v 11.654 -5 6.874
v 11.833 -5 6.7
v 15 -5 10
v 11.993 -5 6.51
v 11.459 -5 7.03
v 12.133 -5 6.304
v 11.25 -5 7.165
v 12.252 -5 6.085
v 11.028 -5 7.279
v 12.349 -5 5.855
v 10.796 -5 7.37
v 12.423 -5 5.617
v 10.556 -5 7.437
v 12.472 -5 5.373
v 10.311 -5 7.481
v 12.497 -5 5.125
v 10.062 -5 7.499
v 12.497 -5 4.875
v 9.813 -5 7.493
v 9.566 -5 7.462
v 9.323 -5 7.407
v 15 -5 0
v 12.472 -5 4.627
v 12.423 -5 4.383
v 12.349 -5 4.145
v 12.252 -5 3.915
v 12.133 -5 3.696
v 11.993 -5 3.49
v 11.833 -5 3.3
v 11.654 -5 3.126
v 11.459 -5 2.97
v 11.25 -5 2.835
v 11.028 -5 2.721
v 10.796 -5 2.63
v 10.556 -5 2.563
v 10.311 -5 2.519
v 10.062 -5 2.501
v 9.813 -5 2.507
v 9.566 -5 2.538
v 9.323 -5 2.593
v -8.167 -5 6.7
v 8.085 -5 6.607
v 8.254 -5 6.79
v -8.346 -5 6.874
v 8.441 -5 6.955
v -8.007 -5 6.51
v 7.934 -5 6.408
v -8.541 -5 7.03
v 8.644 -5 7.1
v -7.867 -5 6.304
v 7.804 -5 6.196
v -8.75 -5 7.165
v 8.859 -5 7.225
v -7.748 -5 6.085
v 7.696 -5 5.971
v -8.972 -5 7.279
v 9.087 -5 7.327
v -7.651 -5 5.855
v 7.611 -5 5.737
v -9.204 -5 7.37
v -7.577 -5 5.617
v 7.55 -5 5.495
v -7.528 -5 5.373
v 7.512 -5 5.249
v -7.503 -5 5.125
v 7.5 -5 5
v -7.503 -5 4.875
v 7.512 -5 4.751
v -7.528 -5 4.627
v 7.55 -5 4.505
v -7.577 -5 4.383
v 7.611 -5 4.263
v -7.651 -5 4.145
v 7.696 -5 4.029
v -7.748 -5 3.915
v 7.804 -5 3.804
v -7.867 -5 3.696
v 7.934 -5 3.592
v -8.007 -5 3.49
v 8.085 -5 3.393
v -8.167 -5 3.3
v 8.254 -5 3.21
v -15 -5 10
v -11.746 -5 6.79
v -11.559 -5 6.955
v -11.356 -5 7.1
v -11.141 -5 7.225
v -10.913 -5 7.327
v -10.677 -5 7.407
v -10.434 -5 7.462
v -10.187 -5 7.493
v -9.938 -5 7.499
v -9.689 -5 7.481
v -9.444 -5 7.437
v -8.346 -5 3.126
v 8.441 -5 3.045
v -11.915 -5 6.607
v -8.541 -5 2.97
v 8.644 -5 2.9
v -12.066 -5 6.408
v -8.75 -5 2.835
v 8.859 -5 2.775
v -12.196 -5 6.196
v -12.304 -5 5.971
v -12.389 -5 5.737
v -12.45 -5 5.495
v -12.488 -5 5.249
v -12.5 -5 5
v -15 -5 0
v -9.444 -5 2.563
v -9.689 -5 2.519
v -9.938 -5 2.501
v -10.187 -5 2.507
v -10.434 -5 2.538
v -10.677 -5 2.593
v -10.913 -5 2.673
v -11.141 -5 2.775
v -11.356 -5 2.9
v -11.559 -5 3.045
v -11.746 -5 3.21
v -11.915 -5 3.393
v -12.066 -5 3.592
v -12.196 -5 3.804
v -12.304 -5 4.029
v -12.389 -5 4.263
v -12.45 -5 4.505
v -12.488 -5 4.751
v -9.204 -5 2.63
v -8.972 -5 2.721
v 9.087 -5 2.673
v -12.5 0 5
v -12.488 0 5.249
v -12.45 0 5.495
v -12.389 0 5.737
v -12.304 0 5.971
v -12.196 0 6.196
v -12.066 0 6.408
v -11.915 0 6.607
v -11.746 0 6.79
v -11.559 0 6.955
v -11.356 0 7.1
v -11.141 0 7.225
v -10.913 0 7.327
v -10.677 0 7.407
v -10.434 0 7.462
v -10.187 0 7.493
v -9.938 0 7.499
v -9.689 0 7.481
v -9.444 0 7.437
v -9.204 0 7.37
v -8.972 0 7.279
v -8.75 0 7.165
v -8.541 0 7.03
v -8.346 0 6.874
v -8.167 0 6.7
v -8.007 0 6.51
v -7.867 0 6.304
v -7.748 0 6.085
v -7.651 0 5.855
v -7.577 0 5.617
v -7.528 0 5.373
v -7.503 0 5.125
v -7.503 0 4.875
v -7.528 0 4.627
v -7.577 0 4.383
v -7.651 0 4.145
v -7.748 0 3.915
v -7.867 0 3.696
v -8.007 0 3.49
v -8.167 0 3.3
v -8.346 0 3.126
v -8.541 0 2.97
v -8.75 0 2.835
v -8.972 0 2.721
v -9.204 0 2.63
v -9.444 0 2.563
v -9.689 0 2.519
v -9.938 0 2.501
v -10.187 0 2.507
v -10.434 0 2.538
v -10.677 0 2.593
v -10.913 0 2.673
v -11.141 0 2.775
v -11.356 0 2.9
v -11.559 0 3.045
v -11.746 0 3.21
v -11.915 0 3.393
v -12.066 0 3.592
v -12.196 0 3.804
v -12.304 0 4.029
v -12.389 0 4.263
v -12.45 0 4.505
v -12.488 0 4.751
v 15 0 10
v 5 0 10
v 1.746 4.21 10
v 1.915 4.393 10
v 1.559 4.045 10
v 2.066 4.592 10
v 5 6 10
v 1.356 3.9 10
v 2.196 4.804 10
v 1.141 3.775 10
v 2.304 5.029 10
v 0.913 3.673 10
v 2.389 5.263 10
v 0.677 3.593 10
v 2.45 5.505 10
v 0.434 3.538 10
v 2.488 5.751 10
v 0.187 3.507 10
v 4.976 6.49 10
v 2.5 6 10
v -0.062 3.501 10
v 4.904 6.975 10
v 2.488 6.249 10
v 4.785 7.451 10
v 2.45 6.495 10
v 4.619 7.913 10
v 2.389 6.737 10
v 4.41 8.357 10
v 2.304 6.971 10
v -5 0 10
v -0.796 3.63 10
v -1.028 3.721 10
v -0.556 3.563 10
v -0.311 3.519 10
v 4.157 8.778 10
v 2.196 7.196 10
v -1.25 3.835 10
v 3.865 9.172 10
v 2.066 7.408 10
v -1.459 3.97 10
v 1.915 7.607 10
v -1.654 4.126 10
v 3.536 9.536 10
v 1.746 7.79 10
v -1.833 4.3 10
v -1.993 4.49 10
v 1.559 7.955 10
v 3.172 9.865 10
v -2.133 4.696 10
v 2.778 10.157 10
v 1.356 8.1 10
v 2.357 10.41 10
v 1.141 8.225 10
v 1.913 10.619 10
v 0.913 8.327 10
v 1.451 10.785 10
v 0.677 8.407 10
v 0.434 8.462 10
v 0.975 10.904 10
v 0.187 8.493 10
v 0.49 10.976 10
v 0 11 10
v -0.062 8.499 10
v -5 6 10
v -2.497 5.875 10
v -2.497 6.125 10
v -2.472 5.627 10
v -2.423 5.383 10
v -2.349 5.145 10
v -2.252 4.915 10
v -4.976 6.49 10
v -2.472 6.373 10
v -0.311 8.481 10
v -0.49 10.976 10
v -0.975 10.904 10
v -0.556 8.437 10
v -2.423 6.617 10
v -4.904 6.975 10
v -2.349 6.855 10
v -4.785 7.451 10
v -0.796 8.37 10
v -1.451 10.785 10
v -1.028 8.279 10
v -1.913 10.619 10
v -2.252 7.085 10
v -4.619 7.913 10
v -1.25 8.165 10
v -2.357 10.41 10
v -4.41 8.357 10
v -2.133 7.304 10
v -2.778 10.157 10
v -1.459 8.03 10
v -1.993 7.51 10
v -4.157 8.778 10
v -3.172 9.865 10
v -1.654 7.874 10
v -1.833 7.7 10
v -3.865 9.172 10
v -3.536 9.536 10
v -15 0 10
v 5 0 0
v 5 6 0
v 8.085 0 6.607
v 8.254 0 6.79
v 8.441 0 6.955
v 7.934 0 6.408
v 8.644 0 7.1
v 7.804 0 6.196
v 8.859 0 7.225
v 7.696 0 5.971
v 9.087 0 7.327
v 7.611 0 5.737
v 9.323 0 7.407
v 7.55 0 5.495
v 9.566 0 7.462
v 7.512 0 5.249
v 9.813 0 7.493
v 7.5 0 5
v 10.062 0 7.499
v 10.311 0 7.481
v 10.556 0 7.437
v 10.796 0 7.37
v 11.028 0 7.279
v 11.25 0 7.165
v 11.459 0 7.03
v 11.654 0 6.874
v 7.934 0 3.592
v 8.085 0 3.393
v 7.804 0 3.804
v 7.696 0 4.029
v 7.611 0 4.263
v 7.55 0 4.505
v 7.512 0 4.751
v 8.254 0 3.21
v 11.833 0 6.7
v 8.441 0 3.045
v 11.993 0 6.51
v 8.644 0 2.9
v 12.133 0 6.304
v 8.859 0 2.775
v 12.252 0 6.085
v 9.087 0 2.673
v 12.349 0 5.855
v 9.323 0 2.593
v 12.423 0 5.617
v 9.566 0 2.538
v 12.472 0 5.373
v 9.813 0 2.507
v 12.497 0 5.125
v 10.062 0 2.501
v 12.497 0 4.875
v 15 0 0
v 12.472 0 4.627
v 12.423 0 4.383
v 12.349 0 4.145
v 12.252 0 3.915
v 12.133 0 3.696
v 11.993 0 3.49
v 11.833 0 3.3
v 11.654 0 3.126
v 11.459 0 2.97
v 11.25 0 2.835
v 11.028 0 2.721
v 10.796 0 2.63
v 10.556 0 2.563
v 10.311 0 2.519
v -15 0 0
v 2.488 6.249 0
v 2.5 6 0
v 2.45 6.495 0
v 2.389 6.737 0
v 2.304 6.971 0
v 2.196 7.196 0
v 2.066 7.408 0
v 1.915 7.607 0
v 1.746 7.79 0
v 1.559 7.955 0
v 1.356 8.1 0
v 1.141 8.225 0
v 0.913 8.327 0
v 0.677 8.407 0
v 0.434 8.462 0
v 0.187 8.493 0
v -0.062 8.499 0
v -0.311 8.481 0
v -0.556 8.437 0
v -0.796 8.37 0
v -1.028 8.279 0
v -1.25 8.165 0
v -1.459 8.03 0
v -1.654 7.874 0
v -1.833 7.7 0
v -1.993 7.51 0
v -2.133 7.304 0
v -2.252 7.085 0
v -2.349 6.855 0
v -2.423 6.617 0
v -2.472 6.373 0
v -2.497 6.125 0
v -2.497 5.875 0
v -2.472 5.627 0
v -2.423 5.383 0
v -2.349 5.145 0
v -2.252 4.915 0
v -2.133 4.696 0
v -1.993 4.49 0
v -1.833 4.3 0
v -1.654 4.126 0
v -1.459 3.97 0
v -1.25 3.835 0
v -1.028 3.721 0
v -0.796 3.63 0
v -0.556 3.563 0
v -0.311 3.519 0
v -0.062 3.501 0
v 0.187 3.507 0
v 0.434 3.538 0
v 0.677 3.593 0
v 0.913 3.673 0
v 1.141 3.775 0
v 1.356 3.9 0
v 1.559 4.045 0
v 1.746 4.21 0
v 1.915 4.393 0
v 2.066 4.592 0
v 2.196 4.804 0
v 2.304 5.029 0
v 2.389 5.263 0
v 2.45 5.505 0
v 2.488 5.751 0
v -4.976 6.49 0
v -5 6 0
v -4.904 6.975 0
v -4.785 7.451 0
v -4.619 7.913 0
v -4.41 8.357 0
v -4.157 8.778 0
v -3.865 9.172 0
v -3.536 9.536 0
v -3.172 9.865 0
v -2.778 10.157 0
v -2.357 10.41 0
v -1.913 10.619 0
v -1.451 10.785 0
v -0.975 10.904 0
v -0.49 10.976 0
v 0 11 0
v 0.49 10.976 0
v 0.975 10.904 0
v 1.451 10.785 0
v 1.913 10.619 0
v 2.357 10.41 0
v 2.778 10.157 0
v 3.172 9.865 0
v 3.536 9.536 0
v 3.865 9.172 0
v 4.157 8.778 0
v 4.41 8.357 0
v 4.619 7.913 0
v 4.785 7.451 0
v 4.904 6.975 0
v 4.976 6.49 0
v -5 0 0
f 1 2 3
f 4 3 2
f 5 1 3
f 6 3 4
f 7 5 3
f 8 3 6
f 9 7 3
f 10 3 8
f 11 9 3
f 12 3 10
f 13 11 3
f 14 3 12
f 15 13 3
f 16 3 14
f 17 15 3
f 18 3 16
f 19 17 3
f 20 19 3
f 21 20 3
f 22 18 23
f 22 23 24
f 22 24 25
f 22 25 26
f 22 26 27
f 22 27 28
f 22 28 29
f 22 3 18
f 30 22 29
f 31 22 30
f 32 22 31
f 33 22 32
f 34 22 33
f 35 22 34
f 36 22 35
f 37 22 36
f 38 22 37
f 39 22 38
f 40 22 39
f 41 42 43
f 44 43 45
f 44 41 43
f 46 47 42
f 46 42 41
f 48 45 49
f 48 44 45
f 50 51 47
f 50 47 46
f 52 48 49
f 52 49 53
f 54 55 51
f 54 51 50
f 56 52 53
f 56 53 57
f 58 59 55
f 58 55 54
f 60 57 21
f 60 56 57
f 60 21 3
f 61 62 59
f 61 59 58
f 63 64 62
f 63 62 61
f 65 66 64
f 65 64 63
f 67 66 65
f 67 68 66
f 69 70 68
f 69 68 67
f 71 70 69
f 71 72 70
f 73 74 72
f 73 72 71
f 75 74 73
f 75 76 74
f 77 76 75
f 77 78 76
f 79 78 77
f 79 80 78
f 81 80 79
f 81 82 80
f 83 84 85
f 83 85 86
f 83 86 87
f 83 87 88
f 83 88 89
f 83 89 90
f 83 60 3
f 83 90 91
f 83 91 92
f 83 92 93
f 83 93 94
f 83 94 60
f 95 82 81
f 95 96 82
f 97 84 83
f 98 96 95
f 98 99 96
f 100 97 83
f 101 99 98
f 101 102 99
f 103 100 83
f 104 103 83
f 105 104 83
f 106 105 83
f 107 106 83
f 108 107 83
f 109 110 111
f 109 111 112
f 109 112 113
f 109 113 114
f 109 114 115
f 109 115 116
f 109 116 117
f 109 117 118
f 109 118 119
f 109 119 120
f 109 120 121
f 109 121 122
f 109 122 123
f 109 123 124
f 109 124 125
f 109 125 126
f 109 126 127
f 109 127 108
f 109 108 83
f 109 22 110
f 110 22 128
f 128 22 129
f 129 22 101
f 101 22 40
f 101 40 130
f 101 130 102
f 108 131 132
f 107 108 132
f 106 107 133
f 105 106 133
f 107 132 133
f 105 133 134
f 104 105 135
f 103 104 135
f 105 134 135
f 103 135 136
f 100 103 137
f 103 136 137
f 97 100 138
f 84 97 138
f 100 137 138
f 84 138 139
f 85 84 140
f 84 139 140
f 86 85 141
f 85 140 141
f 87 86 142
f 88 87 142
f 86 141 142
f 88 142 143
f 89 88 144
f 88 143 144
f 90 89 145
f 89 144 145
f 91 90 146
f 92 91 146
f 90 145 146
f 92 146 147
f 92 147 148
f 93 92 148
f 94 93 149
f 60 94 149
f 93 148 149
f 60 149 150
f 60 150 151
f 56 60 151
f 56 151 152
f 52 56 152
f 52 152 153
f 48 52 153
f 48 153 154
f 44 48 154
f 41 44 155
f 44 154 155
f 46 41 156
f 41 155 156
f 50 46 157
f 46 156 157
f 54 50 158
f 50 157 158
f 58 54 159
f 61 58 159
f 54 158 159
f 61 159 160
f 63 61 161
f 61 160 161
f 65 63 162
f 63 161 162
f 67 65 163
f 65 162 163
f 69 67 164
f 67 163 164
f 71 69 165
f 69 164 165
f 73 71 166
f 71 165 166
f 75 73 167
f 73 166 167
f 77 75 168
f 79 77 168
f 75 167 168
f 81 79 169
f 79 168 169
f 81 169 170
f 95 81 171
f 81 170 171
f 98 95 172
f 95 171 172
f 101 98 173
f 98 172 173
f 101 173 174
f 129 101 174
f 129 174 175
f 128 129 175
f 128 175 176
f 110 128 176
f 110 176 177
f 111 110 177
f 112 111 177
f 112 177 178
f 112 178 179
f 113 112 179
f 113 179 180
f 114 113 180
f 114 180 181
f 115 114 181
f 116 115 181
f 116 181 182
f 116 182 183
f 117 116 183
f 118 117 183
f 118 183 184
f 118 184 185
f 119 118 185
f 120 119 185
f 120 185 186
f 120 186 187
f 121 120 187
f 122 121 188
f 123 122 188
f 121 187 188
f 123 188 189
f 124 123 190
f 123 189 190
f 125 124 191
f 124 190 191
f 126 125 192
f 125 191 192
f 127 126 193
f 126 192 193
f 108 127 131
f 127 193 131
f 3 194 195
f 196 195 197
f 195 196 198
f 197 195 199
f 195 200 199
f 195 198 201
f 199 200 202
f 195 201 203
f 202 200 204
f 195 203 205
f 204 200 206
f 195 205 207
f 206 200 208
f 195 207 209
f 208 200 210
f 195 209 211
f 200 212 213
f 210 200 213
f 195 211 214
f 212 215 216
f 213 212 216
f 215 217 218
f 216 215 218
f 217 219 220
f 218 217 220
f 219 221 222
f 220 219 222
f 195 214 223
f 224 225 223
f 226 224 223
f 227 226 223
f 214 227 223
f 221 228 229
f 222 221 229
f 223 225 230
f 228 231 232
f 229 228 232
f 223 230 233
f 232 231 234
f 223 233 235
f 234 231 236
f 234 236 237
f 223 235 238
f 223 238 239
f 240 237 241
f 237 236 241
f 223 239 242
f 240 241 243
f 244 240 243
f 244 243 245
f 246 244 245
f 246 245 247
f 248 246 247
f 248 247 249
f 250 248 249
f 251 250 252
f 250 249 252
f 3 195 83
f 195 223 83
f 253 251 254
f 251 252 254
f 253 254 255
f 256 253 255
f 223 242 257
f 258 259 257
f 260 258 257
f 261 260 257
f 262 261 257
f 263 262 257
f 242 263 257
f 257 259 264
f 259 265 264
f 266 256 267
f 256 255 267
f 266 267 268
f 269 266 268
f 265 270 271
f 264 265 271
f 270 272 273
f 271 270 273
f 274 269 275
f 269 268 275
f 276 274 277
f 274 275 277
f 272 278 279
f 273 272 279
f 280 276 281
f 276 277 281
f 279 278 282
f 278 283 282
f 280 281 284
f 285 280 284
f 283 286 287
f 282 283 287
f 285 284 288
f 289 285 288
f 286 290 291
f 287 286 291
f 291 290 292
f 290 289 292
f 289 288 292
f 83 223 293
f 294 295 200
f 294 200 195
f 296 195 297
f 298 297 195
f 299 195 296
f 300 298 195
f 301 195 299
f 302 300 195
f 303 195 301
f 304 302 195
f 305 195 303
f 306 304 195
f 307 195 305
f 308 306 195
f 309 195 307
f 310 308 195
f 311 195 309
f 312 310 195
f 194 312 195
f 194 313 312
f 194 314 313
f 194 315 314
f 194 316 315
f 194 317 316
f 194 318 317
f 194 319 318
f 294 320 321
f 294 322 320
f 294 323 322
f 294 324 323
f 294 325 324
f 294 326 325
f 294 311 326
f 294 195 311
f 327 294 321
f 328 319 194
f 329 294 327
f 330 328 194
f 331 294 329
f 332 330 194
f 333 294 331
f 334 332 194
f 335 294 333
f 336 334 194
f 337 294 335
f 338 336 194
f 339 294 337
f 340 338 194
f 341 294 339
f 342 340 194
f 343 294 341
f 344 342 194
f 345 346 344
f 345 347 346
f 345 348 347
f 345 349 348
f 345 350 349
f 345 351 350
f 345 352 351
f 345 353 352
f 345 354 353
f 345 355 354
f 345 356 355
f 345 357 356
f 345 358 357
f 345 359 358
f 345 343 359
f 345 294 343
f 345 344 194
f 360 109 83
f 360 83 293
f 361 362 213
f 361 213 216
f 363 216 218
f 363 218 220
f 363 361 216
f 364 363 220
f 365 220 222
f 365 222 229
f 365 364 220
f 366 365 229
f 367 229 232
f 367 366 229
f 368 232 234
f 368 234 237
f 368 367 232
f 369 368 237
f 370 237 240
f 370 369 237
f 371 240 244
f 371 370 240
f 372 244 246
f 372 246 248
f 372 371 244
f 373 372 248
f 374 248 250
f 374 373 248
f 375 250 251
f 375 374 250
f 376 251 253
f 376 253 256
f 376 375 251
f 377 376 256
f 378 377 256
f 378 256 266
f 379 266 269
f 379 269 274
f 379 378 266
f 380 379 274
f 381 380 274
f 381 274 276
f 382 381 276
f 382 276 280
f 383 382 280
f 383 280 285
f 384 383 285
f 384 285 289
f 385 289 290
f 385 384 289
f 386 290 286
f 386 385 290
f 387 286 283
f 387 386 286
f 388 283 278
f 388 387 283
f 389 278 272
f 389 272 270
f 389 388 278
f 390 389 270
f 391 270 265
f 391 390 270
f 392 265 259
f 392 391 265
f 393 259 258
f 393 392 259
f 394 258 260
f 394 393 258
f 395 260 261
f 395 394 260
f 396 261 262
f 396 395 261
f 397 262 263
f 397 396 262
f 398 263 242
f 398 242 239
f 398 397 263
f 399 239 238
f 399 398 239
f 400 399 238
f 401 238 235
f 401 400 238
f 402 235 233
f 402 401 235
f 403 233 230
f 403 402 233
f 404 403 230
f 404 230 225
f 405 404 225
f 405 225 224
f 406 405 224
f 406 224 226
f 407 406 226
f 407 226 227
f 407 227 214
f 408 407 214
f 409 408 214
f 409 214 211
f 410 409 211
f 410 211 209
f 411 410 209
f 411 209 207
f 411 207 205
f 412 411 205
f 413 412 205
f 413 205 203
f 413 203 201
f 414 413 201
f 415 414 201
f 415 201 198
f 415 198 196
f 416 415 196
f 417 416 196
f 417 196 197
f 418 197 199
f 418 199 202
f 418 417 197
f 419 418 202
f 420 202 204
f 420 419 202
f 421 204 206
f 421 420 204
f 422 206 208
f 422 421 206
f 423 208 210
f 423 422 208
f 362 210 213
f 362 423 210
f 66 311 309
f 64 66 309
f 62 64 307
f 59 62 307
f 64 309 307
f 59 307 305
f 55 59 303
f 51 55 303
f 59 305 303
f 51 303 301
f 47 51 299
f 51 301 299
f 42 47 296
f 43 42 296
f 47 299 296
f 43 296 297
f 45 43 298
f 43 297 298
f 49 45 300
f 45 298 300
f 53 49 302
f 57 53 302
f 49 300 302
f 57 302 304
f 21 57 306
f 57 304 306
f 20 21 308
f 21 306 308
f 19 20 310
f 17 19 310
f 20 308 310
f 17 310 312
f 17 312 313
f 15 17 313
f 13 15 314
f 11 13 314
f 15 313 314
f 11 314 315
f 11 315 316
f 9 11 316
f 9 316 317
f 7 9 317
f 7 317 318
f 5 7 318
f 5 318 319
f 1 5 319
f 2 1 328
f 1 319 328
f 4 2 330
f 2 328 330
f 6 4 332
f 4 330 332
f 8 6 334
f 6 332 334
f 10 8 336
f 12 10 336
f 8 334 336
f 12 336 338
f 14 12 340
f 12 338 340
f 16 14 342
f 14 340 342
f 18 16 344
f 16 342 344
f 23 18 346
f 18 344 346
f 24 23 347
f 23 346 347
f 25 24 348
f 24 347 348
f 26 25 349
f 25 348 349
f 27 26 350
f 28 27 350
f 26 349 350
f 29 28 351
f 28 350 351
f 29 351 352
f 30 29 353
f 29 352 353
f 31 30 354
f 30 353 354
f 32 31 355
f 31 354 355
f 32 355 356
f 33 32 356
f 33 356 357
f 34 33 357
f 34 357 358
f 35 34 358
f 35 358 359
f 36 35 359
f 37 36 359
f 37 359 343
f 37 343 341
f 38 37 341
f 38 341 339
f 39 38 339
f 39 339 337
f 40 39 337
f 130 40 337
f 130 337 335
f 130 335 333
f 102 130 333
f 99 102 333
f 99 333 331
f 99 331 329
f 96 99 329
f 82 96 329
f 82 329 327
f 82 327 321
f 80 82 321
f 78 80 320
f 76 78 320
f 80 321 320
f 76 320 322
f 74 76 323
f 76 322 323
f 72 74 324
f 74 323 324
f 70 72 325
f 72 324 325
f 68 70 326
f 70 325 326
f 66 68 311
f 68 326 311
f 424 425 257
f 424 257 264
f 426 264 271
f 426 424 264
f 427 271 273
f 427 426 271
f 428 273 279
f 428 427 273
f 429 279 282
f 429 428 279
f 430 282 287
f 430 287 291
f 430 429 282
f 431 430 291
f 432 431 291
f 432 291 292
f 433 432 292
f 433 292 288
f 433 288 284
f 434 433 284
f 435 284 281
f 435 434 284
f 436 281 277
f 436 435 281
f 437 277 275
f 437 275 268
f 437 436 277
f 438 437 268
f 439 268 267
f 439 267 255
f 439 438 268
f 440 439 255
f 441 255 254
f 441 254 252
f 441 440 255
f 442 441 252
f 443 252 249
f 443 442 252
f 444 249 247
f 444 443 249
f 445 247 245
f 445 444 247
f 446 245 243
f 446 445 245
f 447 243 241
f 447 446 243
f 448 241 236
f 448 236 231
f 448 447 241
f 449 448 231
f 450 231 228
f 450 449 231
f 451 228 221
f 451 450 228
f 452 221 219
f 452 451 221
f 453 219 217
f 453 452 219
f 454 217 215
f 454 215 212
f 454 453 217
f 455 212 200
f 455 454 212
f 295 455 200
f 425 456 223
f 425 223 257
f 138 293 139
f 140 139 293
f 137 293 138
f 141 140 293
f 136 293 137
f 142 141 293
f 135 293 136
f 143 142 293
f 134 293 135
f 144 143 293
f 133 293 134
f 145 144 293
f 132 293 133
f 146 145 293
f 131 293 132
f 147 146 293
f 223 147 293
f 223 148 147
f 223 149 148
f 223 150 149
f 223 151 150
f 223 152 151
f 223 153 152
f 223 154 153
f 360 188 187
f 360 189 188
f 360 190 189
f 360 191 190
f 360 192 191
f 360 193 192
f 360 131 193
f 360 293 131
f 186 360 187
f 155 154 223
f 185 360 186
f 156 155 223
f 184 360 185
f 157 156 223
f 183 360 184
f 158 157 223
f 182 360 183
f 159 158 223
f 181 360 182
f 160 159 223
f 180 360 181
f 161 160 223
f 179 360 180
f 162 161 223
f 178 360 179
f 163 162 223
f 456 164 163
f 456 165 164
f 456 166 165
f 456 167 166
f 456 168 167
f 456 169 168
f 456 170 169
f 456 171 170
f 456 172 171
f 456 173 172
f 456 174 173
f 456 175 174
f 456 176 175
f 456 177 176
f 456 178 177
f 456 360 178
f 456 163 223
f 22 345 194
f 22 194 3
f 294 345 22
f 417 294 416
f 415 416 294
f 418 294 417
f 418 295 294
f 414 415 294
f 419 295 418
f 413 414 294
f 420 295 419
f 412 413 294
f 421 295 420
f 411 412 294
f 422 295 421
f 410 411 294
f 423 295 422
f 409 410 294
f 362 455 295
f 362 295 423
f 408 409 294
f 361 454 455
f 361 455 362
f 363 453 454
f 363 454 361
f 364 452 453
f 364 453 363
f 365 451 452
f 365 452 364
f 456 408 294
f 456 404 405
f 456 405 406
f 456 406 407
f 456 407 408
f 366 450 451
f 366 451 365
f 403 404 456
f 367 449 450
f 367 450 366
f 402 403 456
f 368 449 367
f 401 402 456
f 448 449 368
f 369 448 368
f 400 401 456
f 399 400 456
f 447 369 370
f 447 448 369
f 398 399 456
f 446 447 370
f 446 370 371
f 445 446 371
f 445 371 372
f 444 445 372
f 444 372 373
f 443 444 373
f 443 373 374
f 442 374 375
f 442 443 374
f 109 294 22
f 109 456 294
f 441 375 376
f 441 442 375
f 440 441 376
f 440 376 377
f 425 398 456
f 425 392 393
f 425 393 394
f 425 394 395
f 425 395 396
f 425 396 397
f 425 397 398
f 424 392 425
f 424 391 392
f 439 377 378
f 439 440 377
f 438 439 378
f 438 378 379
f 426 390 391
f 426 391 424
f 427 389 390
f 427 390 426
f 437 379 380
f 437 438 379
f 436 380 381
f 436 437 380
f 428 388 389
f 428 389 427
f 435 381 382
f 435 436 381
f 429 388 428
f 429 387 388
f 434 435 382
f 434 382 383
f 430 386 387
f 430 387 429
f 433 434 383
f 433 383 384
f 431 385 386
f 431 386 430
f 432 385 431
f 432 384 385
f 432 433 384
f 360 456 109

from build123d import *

# Parameters (mm, degrees)
SKETCH_1_R          = 2.5
EXTRUDE_1_DEPTH     = 10
SKETCH_2_R          = 2.5
CUT_EXTRUDE_1_DEPTH = 5
SKETCH_3_R          = 2.5
CUT_EXTRUDE_2_DEPTH = 5


with BuildPart() as part:
    # 草图1 → 凸台-拉伸1 (new body)
    with BuildSketch(Plane.XY):
        with BuildLine():
            Line((5, 0), (15, 0))
            Line((15, 0), (15, -5))
            Line((15, -5), (-15, -5))
            Line((-15, -5), (-15, 0))
            Line((-15, 0), (-5, 0))
            Line((-5, 0), (-5, 6))
            ThreePointArc((-5, 6), (0, 11), (5, 6))
            Line((5, 6), (5, 0))
        make_face()
        with Locations((0, 6)):
            Circle(SKETCH_1_R, mode=Mode.SUBTRACT)
    extrude(amount=EXTRUDE_1_DEPTH)

    # 草图2 → 切除-拉伸1 (cut)
    with BuildSketch(Plane(origin=(0, 0, 0), x_dir=(1, 0, 0), z_dir=(0, 1, 0))):
        with Locations(Location((-10, -5, 0), (0, 0, 180))):
            Circle(SKETCH_2_R)
    extrude(amount=-CUT_EXTRUDE_1_DEPTH, mode=Mode.SUBTRACT)

    # 草图3 → 切除-拉伸2 (cut)
    with BuildSketch(Plane(origin=(0, 0, 0), x_dir=(1, 0, 0), z_dir=(0, 1, 0))):
        with Locations(Location((10, -5, 0), (0, 0, 180))):
            Circle(SKETCH_3_R)
    extrude(amount=-CUT_EXTRUDE_2_DEPTH, mode=Mode.SUBTRACT)


solid = part.part
